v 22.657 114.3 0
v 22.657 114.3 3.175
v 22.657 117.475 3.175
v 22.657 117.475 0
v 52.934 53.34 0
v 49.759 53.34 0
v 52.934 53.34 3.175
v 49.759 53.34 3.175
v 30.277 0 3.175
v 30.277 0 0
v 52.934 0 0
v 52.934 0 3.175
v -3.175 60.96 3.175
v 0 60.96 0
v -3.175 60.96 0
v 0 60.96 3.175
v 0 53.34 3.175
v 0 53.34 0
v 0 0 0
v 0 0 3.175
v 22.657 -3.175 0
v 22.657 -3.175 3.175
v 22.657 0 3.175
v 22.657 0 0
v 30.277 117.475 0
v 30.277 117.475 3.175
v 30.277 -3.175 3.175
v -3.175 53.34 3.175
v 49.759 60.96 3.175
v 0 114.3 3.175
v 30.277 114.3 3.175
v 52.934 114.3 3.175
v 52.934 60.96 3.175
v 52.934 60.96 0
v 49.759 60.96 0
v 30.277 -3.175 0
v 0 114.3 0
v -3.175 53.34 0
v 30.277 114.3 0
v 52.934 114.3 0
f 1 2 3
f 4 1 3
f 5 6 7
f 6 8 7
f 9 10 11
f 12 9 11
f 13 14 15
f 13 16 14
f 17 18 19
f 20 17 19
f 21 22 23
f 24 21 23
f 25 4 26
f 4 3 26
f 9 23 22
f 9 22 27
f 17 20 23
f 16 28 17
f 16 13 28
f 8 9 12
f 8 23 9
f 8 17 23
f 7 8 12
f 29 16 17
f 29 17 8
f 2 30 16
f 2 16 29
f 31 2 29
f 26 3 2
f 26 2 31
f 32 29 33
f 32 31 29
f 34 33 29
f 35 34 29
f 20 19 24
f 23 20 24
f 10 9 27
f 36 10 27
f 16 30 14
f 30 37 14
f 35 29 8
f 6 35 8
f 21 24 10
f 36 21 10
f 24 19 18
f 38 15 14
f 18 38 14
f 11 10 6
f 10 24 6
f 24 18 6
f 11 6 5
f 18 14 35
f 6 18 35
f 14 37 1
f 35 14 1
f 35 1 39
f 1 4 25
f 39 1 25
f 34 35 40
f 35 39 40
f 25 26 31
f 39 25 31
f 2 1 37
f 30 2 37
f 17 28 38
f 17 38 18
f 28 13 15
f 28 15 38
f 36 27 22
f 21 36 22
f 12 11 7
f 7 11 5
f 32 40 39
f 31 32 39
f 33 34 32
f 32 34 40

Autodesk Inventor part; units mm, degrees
ref_plane "YZ Plane" through (0, 0, 0) normal (1, 0, 0) x (0, 1, 0)
ref_plane "XZ Plane" through (0, 0, 0) normal (0, 1, 0) x (-1, 0, 0)
ref_plane "XY Plane" through (0, 0, 0) normal (0, 0, 1) x (1, 0, 0)
sketch "Sketch1" plane through (0, 0, 0) normal (0, 0, 1) x (1, 0, 0)
  line L0 (0, 0) -> (52.9336, 0)
  line L1 (52.9336, 0) -> (52.9336, 114.3)
  line L2 (52.9336, 114.3) -> (0, 114.3)
  line L3 (0, 114.3) -> (0, 0)
  dimension "d0" = 114.3
  dimension "d1" = 52.9336
extrude "Extrusion1" add sketch "Sketch1" along normal blind 3.175
sketch "Sketch2" plane through (0, 0, 3.175) normal (0, 0, 1) x (1, 0, 0)
  line L0 (0, 114.3) -> (0, 0) projected
  line L1 (52.9336, 0) -> (52.9336, 114.3) projected
  line L2 (0, 60.96) -> (-3.175, 60.96)
  line L3 (-3.175, 60.96) -> (-3.175, 53.34)
  line L4 (-3.175, 53.34) -> (0, 53.34)
  line L5 (0, 53.34) -> (0, 60.96)
  line L6 (52.9336, 60.96) -> (49.7586, 60.96)
  line L7 (49.7586, 60.96) -> (49.7586, 53.34)
  line L8 (49.7586, 53.34) -> (52.9336, 53.34)
  line L9 (52.9336, 53.34) -> (52.9336, 60.96)
  line L10 (52.9336, 114.3) -> (0, 114.3) projected
  line L11 (0, 0) -> (52.9336, 0) projected
  line L12 (22.6568, 114.3) -> (22.6568, 117.475)
  line L13 (22.6568, 117.475) -> (30.2768, 117.475)
  line L14 (30.2768, 117.475) -> (30.2768, 114.3)
  line L15 (30.2768, 114.3) -> (22.6568, 114.3)
  line L16 (30.2768, 0) -> (30.2768, -3.175)
  line L17 (30.2768, -3.175) -> (22.6568, -3.175)
  line L18 (22.6568, -3.175) -> (22.6568, 0)
  line L19 (22.6568, 0) -> (30.2768, 0)
  point P0 (0, 57.15)
  point P1 (52.9336, 57.15)
  point P2 (26.4668, 114.3)
  point P3 (26.4668, 0)
  dimension "d4" = 3.81
  dimension "d5" = 7.62
  dimension "d6" = 3.175
  dimension "d7" = 3.81
  dimension "d8" = 7.62
  dimension "d9" = 3.175
  dimension "d10" = 3.81
  dimension "d11" = 3.81
  dimension "d12" = 3.175
  dimension "d13" = 7.62
  dimension "d14" = 3.81
  dimension "d15" = 3.175
extrude "Extrusion2" add sketch "Sketch2" against normal blind 3.175 contours L0 L4 L3 L2 | L12 L13 L14 L10 | L11 L16 L17 L18 | L1 L8 L7 L6
extrude "Extrusion3" cut sketch "Sketch2" against normal blind 3.175 contours L1 L8 L7 L6
properties part number "Birdhouse Wall"
